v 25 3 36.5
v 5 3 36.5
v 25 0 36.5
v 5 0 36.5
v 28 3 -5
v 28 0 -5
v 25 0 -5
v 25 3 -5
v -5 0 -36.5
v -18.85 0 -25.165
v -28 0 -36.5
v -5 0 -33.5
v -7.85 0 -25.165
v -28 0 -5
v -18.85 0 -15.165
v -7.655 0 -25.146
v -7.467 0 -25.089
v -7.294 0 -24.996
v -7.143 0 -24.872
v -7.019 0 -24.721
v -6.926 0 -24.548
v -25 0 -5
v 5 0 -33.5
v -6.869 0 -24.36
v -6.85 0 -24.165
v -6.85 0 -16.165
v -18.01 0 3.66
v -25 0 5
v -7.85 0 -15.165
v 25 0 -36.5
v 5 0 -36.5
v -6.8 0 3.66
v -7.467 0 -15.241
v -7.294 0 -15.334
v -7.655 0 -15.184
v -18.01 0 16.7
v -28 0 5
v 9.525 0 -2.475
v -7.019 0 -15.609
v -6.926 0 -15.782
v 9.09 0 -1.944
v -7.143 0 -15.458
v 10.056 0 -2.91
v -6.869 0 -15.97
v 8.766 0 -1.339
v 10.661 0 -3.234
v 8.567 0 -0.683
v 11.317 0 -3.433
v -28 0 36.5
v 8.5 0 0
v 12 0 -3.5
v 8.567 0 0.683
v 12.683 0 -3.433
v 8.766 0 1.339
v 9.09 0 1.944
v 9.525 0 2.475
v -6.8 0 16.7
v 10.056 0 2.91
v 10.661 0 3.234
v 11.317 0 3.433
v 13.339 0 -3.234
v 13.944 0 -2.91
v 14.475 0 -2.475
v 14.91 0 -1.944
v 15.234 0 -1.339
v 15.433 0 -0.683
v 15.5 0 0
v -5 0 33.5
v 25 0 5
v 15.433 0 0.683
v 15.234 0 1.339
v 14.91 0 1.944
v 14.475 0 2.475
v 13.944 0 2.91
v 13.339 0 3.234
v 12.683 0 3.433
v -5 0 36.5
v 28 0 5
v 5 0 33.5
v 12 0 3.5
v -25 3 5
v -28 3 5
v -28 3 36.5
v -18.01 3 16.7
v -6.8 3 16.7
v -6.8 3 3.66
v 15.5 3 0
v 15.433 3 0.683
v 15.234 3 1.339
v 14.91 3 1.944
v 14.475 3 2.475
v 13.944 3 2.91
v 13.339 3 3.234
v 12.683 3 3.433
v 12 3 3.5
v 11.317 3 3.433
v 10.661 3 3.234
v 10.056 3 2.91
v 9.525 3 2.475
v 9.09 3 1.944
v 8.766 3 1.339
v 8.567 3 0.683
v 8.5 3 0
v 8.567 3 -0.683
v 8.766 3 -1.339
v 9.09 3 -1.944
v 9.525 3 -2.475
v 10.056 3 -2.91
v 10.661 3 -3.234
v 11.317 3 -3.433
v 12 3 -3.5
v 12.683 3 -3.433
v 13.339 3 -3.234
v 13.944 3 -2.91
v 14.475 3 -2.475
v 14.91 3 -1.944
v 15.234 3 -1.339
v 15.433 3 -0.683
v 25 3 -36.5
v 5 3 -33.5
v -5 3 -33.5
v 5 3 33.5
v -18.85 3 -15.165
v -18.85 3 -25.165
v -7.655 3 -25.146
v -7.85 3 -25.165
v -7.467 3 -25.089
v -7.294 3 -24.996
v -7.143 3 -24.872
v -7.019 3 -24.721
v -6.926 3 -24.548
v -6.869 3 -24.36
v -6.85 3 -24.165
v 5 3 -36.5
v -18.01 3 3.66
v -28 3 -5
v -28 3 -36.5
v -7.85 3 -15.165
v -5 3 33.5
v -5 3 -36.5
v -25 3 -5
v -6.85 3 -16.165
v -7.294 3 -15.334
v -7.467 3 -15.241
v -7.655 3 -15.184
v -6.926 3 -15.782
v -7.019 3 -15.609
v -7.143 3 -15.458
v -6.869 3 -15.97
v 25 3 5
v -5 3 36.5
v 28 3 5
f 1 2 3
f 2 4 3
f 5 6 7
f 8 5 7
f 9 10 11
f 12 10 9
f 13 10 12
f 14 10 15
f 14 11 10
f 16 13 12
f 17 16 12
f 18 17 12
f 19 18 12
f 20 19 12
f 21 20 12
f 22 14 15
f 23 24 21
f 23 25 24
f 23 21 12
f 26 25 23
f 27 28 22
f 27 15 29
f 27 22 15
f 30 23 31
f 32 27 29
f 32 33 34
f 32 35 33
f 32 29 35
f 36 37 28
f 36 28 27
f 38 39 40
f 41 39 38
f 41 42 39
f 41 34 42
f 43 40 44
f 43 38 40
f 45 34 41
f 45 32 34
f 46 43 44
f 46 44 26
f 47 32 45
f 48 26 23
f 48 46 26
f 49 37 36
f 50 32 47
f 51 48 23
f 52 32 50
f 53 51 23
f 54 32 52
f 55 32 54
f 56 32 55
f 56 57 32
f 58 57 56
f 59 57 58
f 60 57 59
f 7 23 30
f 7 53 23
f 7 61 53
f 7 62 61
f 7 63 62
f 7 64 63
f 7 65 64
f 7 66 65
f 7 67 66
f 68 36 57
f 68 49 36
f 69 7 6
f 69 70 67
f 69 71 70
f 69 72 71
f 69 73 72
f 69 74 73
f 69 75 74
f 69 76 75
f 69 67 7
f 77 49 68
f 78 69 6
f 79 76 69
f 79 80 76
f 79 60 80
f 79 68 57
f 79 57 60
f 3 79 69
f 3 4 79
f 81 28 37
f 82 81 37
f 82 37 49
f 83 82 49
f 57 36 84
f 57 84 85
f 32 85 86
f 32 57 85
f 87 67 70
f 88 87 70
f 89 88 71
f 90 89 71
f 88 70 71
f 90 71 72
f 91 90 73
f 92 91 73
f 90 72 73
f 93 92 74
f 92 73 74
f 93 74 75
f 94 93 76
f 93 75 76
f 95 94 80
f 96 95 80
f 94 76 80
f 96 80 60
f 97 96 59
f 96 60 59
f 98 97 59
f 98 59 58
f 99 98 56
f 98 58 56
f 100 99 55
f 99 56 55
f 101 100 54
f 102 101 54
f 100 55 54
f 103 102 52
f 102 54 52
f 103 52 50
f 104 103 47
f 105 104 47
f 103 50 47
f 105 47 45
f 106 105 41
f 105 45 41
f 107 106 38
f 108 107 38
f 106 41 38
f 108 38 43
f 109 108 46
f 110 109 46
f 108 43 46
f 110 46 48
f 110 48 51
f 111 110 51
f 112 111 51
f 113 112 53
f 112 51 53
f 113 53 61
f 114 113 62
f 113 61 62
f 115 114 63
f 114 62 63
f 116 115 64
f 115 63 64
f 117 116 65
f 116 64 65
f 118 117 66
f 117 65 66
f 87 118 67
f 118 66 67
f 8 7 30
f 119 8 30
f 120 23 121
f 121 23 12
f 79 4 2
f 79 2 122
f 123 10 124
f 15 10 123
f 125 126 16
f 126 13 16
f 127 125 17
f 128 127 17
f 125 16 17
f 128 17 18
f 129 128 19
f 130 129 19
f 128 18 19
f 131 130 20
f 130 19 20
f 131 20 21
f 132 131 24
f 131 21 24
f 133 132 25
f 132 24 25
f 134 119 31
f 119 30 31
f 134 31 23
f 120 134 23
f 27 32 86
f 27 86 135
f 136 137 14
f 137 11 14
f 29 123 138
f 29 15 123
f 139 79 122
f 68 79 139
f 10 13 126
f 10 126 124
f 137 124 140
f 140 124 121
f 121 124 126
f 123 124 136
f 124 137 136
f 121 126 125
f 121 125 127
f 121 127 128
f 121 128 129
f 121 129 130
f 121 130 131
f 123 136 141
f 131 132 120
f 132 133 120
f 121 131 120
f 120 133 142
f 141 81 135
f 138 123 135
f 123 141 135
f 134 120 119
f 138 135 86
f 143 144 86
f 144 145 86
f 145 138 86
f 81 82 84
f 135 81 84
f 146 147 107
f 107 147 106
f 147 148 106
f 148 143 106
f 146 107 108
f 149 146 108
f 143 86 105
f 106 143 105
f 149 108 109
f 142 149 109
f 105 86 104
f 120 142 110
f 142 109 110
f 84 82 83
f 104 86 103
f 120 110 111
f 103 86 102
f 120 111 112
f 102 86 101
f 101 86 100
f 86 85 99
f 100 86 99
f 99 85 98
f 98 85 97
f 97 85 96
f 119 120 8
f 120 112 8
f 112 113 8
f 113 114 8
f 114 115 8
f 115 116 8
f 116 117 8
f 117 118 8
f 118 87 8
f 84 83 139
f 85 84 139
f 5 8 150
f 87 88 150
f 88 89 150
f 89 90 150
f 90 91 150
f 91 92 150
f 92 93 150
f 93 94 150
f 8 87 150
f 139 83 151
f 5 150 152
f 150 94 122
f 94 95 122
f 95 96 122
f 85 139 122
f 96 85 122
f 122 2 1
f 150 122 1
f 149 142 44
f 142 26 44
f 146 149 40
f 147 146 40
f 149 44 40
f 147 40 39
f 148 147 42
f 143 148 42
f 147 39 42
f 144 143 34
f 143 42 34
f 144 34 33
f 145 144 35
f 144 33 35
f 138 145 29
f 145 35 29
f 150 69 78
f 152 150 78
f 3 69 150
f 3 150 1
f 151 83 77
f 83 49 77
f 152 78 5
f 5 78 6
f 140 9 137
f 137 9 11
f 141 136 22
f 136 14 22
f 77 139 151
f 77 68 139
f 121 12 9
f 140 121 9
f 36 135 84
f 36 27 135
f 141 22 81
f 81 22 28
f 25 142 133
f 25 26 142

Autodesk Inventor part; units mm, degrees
ref_plane "YZ Plane" through (0, 0, 0) normal (1, 0, 0) x (0, 1, 0)
ref_plane "XZ Plane" through (0, 0, 0) normal (0, 1, 0) x (-1, 0, 0)
ref_plane "XY Plane" through (0, 0, 0) normal (0, 0, 1) x (1, 0, 0)
sketch "Sketch1" plane through (0, 0, 0) normal (0, 1, 0) x (-1, 0, 0)
  line L0 (-28, -36.5) -> (28, -36.5)
  line L1 (28, -36.5) -> (28, 36.5)
  line L2 (28, 36.5) -> (-28, 36.5)
  line L3 (-28, 36.5) -> (-28, -36.5)
  line L4 (-28, -36.5) -> (28, 36.5) construction
  line L5 (28, -36.5) -> (-28, 36.5) construction
  point P0 (0, 0)
  dimension "d0" = 73
  dimension "d1" = 56
extrude "Extrusion1" add sketch "Sketch1" along normal blind 3
sketch "Sketch3" plane through (0, 0, 0) normal (0, -1, 0) x (1, 0, 0)
  line L0 (-7.3, 4.62) -> (-7.3, 15.74) projected
  line L1 (-17.51, 4.16) -> (-7.86, 4.16) projected
  line L2 (-17.51, 15.74) -> (-17.51, 4.62) projected
  line L3 (-7.86, 16.2) -> (-17.51, 16.2) projected
  line L4 (-18.35, -24.665) -> (-7.85, -24.665) projected
  line L5 (-7.35, -24.165) -> (-7.35, -16.165) projected
  arc A0 (-7.85, -24.665) -> (-7.35, -24.165) centre (-7.85, -24.165) ccw projected
  arc A1 (-7.35, -16.165) -> (-7.85, -15.665) centre (-7.85, -16.165) ccw projected
  line L6 (-7.85, -15.665) -> (-18.35, -15.665) projected
  line L7 (-18.35, -15.665) -> (-18.35, -24.665)
  line L8 (-7.3, 4.62) -> (-7.3, 4.16)
  line L9 (-7.3, 4.16) -> (-7.86, 4.16)
  line L10 (-7.86, 16.2) -> (-7.3, 16.2)
  line L11 (-7.3, 16.2) -> (-7.3, 15.74)
  line L12 (-17.51, 16.2) -> (-17.51, 15.74)
  line L13 (-17.51, 4.16) -> (-17.51, 4.62)
  line L14 (-6.8, 15.74) -> (-6.8, 4.62)
  line L15 (-6.8, 4.62) -> (-6.8, 3.66)
  line L16 (-6.8, 3.66) -> (-7.86, 3.66)
  line L17 (-7.86, 3.66) -> (-18.01, 3.66)
  line L18 (-18.01, 3.66) -> (-18.01, 4.62)
  line L19 (-18.01, 4.62) -> (-18.01, 15.74)
  line L20 (-18.01, 15.74) -> (-18.01, 16.7)
  line L21 (-18.01, 16.7) -> (-7.86, 16.7)
  line L22 (-7.86, 16.7) -> (-6.8, 16.7)
  line L23 (-6.8, 16.7) -> (-6.8, 15.74)
  line L24 (-18.85, -15.165) -> (-7.85, -15.165)
  arc A2 (-6.85, -16.165) -> (-7.85, -15.165) centre (-7.85, -16.165) ccw
  line L25 (-6.85, -16.165) -> (-6.85, -24.165)
  arc A3 (-7.85, -25.165) -> (-6.85, -24.165) centre (-7.85, -24.165) ccw
  line L26 (-7.85, -25.165) -> (-18.85, -25.165)
  line L27 (-18.85, -25.165) -> (-18.85, -15.165)
  dimension "d38" = 0.5
  dimension "d39" = 0.5
extrude "Extrusion3" cut sketch "Sketch3" against normal through all contours L8 L9 L1 L13 L2 L12 L3 L10 L11 L0 | L7 L6 A1 L5 A0 L4 | L14 L15 L16 L17 L18 L19 L20 L21 L22 L23 | L24 A2 L25 A3 L26 L27
sketch "Sketch4" plane through (0, 0, 0) normal (0, -1, 0) x (1, 0, 0)
  circle A0 centre (12, 0) radius 3.5
  line L0 (28, 36.5) -> (28, -36.5) projected
  point P0 (0, 0)
  dimension "d12" = 7
  dimension "d13" = 16
extrude "Extrusion4" cut sketch "Sketch4" against normal through all
sketch "Sketch7" plane through (0, 0, 0) normal (0, -1, 0) x (1, 0, 0)
  line L0 (-5, 36.5) -> (5, 36.5)
  line L1 (5, 36.5) -> (5, 33.5)
  line L2 (5, 33.5) -> (-5, 33.5)
  line L3 (-5, 33.5) -> (-5, 36.5)
  line L4 (-5, 36.5) -> (5, 33.5) construction
  line L5 (5, 36.5) -> (-5, 33.5) construction
  line L6 (-28, 36.5) -> (28, 36.5) projected
  line L7 (-5, -36.5) -> (5, -36.5)
  line L8 (5, -36.5) -> (5, -33.5)
  line L9 (5, -33.5) -> (-5, -33.5)
  line L10 (-5, -33.5) -> (-5, -36.5)
  line L11 (-5, -36.5) -> (5, -33.5) construction
  line L12 (5, -36.5) -> (-5, -33.5) construction
  line L13 (28, -36.5) -> (-28, -36.5) projected
  line L14 (-28, -5) -> (-25, -5)
  line L15 (-25, -5) -> (-25, 5)
  line L16 (-25, 5) -> (-28, 5)
  line L17 (-28, 5) -> (-28, -5)
  line L18 (-28, -5) -> (-25, 5) construction
  line L19 (-25, -5) -> (-28, 5) construction
  line L20 (-28, -36.5) -> (-28, 36.5) projected
  line L21 (25, -5) -> (28, -5)
  line L22 (28, -5) -> (28, 5)
  line L23 (28, 5) -> (25, 5)
  line L24 (25, 5) -> (25, -5)
  line L25 (25, -5) -> (28, 5) construction
  line L26 (28, -5) -> (25, 5) construction
  line L27 (28, 36.5) -> (28, -36.5) projected
  point P0 (0, 0)
  point P1 (0, 35)
  point P2 (0, 36.5)
  point P3 (0, -35)
  point P4 (0, -36.5)
  point P5 (-26.5, 0)
  point P6 (26.5, 0)
  dimension "d26" = 10
  dimension "d27" = 3
  dimension "d28" = 10
  dimension "d29" = 3
  dimension "d30" = 3
  dimension "d31" = 10
  dimension "d32" = 3
  dimension "d33" = 10
  dimension "d36" = 36.5
extrude "Extrusion7" cut sketch "Sketch7" against normal through all contours L0 L1 L2 L3 | L16 L15 L14 L17 | L22 L21 L24 L23 | L10 L9 L8 L7
sketch "Sketch9" plane through (0, 0, 0) normal (0, -1, 0) x (1, 0, 0)
  line L0 (25, 5) -> (28, 5) projected
  line L1 (25, 5) -> (25, 36.5)
  line L2 (5, 36.5) -> (28, 36.5) projected
  line L3 (25, -5) -> (25, 5) projected
  line L4 (25, -5) -> (25, -36.5)
  line L5 (28, -36.5) -> (5, -36.5) projected
  line L6 (28, 36.5) -> (28, 5) projected
  line L7 (28, -5) -> (25, -5) projected
  line L8 (28, 5) -> (28, -5)
  line L9 (28, -5) -> (28, -36.5) projected
  point P0 (0, 0)
extrude "Extrusion8" add sketch "Sketch9" against normal blind 3 contours L0 L8 L7 L3
extrude "Extrusion9" cut sketch "Sketch9" against normal through all contours L1 L2 L6 L0 | L7 L9 L5 L4
sketch "Sketch10" plane through (0, 3, 0) normal (0, 1, 0) x (1, 0, 0)
  line L0 (-5, 36.5) -> (-5, 33.5) projected
  line L1 (-5, 33.5) -> (5, 33.5) projected
  line L2 (5, 33.5) -> (5, 36.5) projected
  line L3 (5, 36.5) -> (25, 36.5) projected
  line L4 (25, 36.5) -> (25, 5) projected
  line L5 (25, 5) -> (28, 5) projected
  line L6 (28, 5) -> (28, -5) projected
  line L7 (28, -5) -> (25, -5) projected
  line L8 (25, -5) -> (25, -36.5) projected
  line L9 (25, -36.5) -> (5, -36.5) projected
  line L10 (5, -36.5) -> (5, -33.5) projected
  line L11 (5, -33.5) -> (-5, -33.5) projected
  line L12 (-5, -33.5) -> (-5, -36.5) projected
  line L13 (-5, -36.5) -> (-28, -36.5) projected
  line L14 (-28, -36.5) -> (-28, -5) projected
  line L15 (-28, -5) -> (-25, -5) projected
  line L16 (-25, -5) -> (-25, 5) projected
  line L17 (-25, 5) -> (-28, 5) projected
  line L18 (-28, 5) -> (-28, 36.5) projected
  line L19 (-28, 36.5) -> (-5, 36.5) projected
  circle A0 centre (12, 0) radius 3.5 projected
  line L20 (-7.85, 25.165) -> (-18.85, 25.165) projected
  line L21 (-18.85, 25.165) -> (-18.85, 15.165) projected
  line L22 (-18.85, 15.165) -> (-7.85, 15.165) projected
  arc A1 (-7.85, 15.165) -> (-6.85, 16.165) centre (-7.85, 16.165) ccw projected
  line L23 (-6.85, 16.165) -> (-6.85, 24.165) projected
  arc A2 (-6.85, 24.165) -> (-7.85, 25.165) centre (-7.85, 24.165) ccw projected
  line L24 (-6.8, -16.7) -> (-6.8, -3.66) projected
  line L25 (-6.8, -3.66) -> (-18.01, -3.66) projected
  line L26 (-18.01, -3.66) -> (-18.01, -16.7) projected
  line L27 (-18.01, -16.7) -> (-6.8, -16.7) projected
  point P0 (0, 0)
properties part number "left"
